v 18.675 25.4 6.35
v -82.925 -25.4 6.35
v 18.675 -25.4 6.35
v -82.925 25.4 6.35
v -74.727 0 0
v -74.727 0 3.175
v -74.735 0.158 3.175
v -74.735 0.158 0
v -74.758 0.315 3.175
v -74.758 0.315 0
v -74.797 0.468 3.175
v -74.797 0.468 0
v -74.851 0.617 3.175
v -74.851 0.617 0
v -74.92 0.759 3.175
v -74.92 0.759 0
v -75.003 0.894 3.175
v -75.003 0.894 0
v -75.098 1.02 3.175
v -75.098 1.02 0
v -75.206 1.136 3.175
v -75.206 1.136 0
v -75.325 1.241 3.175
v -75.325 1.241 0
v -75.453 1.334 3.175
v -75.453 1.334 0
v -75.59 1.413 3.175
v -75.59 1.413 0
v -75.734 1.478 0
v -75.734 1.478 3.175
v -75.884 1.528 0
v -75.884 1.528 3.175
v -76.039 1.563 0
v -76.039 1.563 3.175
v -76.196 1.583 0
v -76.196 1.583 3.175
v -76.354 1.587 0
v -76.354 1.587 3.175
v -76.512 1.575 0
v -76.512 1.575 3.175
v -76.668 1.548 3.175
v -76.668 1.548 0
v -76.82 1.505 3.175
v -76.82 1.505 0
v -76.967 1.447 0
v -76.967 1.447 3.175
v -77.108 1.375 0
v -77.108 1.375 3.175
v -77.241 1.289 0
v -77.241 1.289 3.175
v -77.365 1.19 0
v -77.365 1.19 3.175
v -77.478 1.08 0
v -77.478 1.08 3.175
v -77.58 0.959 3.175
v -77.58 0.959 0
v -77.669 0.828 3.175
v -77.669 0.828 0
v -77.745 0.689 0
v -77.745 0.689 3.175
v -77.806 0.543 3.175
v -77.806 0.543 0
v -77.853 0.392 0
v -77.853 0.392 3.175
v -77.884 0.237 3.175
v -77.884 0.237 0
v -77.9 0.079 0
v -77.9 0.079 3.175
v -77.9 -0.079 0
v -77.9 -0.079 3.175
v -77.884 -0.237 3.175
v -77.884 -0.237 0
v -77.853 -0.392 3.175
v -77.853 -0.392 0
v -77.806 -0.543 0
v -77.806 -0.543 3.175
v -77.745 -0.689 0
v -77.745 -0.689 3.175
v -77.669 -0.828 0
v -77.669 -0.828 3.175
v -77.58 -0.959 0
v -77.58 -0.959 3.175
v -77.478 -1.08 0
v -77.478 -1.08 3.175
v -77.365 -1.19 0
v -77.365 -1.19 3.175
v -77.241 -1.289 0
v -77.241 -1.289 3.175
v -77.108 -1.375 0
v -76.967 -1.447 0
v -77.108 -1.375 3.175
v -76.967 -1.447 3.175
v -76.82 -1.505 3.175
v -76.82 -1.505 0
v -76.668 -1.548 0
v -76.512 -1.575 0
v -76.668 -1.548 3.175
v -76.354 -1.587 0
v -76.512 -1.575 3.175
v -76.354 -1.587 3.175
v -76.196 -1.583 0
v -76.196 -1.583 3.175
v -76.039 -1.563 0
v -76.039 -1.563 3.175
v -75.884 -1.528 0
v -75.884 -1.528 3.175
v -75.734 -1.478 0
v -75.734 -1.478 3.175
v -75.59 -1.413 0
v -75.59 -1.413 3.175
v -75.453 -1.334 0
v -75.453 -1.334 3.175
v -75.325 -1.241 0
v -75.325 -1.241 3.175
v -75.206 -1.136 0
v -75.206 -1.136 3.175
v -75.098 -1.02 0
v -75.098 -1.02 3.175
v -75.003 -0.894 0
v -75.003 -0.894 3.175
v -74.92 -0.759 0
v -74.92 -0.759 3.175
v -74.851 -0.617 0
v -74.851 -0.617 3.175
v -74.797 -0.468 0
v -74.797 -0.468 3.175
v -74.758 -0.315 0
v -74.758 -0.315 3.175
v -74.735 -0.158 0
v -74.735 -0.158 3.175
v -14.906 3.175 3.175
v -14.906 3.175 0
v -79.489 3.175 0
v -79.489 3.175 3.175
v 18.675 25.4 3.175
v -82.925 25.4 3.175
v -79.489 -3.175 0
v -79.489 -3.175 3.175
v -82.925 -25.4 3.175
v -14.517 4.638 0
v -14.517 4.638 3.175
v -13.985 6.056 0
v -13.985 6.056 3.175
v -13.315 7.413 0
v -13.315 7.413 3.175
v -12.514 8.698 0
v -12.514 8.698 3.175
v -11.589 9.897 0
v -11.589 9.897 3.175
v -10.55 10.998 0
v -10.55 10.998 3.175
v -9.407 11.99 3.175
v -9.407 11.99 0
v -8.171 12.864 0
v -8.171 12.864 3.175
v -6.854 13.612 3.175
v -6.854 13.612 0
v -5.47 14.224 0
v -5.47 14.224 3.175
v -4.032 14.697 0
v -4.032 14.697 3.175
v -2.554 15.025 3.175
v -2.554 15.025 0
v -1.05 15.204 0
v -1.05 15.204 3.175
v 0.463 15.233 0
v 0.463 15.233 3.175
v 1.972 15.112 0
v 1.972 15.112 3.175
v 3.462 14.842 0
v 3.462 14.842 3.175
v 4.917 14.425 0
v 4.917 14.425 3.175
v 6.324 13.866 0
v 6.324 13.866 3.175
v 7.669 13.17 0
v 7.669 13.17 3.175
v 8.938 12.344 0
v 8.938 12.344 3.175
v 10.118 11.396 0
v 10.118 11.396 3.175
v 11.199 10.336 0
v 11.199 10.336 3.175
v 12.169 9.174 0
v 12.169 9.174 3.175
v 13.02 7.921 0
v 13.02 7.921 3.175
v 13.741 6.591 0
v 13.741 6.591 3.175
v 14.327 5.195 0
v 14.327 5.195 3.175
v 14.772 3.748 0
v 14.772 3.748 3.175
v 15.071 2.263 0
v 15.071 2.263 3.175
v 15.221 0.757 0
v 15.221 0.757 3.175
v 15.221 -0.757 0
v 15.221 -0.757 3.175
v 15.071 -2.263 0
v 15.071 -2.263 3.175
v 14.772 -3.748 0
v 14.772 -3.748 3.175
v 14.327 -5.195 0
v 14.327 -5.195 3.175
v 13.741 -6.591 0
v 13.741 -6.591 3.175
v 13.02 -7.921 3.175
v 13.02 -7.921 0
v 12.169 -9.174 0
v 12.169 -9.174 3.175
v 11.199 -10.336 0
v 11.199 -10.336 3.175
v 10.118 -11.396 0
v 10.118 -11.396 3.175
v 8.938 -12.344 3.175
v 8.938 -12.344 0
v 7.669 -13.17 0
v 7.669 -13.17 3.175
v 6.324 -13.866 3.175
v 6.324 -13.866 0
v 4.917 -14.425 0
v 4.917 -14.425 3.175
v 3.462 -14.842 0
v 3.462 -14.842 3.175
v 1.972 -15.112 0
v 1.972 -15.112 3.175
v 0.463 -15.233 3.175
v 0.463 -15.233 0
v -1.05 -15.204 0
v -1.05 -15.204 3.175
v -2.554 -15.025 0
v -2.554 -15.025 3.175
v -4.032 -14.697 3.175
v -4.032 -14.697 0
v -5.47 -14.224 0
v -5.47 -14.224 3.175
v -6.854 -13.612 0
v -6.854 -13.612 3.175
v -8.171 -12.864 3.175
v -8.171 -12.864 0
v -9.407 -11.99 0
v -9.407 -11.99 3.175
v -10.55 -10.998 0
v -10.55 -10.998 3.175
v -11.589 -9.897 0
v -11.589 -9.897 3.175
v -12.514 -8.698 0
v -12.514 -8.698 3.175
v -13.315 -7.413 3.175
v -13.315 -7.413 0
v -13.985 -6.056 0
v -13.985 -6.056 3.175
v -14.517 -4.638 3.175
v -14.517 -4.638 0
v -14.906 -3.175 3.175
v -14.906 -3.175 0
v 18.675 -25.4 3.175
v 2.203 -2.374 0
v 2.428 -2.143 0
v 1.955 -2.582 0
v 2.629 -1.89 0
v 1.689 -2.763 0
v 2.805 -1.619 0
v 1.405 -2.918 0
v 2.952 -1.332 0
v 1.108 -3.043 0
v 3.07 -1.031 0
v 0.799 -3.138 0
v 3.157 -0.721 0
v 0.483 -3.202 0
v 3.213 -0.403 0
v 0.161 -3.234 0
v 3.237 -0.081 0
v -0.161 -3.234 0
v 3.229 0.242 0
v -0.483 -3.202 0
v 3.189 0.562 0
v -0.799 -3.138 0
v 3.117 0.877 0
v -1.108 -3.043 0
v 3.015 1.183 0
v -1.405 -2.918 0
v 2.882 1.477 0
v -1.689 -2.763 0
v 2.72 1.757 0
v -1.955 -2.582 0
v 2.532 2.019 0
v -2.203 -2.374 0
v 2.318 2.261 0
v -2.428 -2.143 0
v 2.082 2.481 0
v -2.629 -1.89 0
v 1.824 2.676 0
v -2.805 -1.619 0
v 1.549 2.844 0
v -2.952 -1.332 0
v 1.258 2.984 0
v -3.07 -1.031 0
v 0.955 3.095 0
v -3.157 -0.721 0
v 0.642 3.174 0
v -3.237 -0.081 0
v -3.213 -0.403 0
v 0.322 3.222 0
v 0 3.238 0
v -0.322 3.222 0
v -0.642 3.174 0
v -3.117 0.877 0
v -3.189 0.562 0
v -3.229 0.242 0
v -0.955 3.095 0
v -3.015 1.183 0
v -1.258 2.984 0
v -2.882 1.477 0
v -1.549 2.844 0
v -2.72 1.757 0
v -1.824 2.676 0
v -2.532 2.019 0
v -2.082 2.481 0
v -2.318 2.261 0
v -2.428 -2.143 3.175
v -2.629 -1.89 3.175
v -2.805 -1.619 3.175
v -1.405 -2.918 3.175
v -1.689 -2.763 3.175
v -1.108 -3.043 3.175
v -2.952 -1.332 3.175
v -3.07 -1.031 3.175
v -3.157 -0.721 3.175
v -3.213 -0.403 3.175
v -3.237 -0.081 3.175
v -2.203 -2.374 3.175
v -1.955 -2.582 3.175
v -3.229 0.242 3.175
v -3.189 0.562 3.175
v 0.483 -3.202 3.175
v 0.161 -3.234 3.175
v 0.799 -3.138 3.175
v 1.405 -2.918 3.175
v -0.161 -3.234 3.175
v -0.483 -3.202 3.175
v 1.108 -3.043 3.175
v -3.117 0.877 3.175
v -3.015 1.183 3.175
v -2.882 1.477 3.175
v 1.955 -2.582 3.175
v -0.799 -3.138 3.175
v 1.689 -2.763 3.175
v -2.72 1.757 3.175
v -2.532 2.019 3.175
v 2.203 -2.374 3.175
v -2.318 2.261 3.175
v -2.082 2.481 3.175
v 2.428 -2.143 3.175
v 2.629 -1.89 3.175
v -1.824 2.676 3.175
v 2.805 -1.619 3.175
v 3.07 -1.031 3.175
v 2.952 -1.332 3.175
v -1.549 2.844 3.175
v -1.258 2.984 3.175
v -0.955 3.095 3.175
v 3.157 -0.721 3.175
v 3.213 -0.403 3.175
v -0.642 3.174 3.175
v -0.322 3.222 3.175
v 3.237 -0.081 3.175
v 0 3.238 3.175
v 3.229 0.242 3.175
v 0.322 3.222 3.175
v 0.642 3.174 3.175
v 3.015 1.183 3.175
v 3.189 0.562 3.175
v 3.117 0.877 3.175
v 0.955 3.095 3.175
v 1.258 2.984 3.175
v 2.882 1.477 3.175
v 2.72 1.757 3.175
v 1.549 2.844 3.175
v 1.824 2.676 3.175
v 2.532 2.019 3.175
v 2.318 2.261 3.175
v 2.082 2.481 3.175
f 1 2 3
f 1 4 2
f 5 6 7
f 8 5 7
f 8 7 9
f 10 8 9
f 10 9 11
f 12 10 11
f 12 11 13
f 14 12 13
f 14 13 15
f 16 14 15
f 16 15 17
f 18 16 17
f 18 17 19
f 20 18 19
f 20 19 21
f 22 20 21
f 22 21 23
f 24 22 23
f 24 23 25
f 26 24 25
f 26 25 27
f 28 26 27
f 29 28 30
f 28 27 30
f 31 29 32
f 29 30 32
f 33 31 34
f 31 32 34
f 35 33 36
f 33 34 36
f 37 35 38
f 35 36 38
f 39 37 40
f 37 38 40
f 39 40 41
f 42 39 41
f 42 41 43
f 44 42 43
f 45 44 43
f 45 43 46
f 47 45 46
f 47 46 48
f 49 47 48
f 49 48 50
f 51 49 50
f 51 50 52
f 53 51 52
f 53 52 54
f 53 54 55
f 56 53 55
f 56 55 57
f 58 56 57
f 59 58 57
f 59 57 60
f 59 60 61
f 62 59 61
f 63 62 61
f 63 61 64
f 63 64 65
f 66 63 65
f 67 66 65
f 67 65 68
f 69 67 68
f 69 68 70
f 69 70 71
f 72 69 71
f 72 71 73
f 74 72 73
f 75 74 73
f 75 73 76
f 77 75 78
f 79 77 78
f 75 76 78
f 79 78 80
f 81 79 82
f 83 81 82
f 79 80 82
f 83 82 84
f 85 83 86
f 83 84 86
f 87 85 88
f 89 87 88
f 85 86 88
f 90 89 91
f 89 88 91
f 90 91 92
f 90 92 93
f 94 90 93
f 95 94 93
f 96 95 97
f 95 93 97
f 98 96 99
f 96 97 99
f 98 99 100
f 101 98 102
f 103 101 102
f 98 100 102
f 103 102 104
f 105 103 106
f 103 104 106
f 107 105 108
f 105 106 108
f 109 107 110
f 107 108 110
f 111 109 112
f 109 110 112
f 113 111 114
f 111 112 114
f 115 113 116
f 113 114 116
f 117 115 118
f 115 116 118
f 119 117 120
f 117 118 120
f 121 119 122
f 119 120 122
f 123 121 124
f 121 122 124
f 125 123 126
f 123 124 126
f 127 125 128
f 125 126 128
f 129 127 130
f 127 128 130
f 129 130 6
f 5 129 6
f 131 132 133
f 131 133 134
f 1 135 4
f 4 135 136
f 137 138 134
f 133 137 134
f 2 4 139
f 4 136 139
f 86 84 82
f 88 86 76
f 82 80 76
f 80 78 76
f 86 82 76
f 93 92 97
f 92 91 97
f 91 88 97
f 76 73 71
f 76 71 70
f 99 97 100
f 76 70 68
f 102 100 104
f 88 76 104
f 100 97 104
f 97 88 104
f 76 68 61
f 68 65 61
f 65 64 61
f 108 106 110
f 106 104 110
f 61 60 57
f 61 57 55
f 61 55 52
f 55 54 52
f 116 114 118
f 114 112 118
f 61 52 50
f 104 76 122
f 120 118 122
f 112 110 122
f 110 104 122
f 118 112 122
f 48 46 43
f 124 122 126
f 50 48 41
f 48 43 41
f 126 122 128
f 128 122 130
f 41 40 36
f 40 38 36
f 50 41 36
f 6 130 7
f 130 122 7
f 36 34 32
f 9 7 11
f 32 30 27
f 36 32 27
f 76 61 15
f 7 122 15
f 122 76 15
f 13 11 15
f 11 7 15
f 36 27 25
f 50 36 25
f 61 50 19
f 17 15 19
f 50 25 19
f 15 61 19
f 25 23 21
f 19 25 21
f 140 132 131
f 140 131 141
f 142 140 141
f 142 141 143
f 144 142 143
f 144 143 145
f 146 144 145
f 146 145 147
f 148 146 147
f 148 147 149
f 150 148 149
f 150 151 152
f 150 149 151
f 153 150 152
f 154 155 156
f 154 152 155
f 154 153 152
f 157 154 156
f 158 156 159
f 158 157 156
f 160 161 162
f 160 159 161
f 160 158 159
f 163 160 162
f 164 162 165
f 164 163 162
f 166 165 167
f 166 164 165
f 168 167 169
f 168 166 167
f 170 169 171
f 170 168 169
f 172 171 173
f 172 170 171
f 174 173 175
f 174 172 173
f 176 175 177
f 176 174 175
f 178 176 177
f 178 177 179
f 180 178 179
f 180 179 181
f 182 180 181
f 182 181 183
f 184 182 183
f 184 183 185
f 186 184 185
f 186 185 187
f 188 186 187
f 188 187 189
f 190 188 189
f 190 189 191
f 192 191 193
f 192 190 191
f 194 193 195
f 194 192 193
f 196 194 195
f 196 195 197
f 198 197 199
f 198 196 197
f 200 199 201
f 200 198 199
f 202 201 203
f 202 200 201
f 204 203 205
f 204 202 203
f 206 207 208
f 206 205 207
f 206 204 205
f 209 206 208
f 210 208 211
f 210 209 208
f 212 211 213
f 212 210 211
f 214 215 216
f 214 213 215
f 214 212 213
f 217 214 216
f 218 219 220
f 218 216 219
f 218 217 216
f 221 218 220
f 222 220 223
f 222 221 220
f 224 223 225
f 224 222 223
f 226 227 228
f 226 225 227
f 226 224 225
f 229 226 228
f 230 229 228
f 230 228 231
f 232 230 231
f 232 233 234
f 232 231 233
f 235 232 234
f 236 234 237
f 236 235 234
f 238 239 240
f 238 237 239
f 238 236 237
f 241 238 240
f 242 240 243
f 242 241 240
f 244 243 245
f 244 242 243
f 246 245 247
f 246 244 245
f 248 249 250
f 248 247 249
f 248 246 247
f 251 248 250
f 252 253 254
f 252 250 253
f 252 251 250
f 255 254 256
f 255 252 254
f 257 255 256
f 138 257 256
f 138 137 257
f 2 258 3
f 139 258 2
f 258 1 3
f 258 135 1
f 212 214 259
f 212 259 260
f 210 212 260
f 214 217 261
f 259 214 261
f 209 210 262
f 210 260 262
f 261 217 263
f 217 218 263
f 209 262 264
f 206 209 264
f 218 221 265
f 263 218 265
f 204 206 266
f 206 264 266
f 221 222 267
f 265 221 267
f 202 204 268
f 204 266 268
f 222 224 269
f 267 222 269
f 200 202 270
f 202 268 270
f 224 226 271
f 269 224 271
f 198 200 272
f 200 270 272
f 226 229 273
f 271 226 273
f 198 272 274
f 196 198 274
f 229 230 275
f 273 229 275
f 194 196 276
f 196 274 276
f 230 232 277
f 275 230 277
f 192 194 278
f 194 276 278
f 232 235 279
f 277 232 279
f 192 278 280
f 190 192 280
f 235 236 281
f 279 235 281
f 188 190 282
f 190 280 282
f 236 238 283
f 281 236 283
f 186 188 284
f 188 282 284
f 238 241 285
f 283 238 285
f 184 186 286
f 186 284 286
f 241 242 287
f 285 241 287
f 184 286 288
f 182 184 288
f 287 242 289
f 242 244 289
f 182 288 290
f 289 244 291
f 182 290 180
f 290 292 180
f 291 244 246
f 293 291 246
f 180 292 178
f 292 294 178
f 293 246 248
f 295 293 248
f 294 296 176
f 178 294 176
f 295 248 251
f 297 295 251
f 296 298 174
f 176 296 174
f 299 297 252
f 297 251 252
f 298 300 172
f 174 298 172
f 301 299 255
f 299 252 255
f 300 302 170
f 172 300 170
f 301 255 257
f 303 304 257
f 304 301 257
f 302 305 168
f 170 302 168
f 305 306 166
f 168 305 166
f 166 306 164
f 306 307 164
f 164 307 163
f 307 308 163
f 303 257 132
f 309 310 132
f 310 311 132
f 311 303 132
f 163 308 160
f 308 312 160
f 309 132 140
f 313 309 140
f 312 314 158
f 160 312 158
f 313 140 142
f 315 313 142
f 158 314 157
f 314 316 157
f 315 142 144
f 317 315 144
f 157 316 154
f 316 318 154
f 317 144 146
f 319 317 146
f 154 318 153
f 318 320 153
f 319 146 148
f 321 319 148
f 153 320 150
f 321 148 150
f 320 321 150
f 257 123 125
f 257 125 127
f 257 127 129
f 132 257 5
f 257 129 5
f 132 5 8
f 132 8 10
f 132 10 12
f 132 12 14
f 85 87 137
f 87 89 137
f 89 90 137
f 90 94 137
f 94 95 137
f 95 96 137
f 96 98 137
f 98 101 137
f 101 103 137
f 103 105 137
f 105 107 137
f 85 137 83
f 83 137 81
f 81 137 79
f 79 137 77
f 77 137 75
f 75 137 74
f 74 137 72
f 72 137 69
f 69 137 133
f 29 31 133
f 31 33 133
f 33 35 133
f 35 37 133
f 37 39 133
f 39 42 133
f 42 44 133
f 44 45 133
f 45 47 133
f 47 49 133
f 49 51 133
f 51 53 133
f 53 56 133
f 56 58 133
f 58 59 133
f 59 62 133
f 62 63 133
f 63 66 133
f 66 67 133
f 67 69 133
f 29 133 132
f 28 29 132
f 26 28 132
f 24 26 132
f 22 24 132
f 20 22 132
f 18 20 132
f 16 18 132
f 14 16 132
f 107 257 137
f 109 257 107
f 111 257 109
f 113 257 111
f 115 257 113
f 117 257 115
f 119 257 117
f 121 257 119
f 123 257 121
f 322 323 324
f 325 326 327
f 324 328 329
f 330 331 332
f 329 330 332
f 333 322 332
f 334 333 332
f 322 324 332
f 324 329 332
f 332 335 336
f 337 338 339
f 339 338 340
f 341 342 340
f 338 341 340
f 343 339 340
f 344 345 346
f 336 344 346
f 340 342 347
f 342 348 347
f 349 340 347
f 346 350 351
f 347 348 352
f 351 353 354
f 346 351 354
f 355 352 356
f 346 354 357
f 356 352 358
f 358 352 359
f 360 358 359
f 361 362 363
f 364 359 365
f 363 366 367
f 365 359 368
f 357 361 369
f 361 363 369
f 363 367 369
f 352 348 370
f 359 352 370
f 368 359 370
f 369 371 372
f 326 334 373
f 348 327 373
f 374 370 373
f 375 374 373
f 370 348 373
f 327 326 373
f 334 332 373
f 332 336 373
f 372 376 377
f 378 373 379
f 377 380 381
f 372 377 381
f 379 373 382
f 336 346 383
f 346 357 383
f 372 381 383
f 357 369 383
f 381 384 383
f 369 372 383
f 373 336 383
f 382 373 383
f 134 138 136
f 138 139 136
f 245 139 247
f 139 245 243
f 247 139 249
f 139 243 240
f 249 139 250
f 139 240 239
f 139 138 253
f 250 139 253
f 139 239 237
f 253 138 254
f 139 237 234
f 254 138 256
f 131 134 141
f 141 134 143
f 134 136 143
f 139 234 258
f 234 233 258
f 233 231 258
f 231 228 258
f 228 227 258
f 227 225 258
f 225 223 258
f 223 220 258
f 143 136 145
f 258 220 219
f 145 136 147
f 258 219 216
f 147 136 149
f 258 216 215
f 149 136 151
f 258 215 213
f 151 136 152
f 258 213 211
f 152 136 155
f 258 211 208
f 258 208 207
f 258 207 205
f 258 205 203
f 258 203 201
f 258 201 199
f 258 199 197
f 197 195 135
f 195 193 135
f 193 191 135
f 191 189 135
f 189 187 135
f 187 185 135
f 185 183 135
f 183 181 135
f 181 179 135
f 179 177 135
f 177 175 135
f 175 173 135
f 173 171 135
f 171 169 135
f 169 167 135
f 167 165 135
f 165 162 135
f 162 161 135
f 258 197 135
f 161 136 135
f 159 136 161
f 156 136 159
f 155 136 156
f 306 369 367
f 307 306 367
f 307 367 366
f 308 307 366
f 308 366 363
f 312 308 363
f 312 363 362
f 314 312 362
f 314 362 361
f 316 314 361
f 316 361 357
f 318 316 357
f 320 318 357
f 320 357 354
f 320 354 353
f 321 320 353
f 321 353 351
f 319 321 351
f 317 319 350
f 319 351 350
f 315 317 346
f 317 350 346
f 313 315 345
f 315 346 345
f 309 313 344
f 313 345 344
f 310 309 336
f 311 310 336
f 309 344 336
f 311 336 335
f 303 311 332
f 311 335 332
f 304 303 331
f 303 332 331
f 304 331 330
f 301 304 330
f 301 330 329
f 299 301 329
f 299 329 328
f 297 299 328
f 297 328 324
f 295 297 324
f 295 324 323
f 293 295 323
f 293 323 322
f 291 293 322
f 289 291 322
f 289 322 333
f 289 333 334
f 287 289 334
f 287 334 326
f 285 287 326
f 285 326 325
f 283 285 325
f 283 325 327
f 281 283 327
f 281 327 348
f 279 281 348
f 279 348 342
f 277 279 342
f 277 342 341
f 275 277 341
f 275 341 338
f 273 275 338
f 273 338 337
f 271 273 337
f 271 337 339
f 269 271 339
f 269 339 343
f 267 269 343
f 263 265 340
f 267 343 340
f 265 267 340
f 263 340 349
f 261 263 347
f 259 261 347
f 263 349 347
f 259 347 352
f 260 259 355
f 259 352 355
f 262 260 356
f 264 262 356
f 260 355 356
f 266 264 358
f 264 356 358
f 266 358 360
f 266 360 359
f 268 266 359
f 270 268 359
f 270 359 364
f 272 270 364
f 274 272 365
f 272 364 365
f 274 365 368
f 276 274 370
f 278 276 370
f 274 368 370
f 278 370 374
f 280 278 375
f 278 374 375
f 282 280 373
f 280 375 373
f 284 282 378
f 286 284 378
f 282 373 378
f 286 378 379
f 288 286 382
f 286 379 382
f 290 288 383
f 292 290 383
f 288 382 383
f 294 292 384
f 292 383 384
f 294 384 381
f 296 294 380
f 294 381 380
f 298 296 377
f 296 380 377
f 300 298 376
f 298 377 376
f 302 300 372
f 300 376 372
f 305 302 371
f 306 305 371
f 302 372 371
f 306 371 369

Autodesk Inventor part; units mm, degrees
ref_plane "YZ Plane" through (0, 0, 0) normal (1, 0, 0) x (0, 1, 0)
ref_plane "XZ Plane" through (0, 0, 0) normal (0, 1, 0) x (-1, 0, 0)
sketch "Sketch1" plane through (0, 0, 0) normal (0, 0, 1) x (1, 0, 0)
  circle A0 centre (0, 0) radius 15.24
extrude "Extrusion1" add sketch "Sketch1" along normal blind 3.175
sketch "Sketch2" plane through (0, 0, 3.175) normal (0, 0, 1) x (1, 0, 0)
  circle A0 centre (0, 0) radius 15.24 projected
  line L0 (-15.24, 0) -> (-15.24, 3.175)
  line L1 (-15.24, 0) -> (-15.24, -3.175)
  dimension "d3" = 3.175
  dimension "d4" = 3.175
ref_plane "Work Plane1" through (-15.24, 0, 3.175) normal (1, 0, 0) x (0, 1, 0)
sketch "Sketch3" plane through (-15.24, 0, 3.175) normal (1, 0, 0) x (0, 1, 0)
  line L0 (15.24, 0) -> (-15.24, 0) projected
  line L1 (-15.24, -3.175) -> (15.24, -3.175) projected
  line L2 (0, -3.175) -> (3.175, -3.175)
  line L3 (3.175, -3.175) -> (3.175, 0)
  line L4 (3.175, 0) -> (-3.175, 0)
  line L5 (-3.175, 0) -> (-3.175, -3.175)
  line L6 (-3.175, -3.175) -> (3.175, -3.175)
  dimension "d6" = 6.35
extrude "Extrusion2" add sketch "Sketch3" against normal blind 64.2493
sketch "Sketch4" plane through (-15.24, 0, 3.175) normal (1, 0, 0) x (0, 0, -1)
  line L0 (3.175, -3.175) -> (3.175, 0) projected
  line L1 (0, 3.175) -> (3.175, 3.175)
  line L2 (3.175, 3.175) -> (3.175, -3.175)
  line L3 (3.175, -3.175) -> (0, -3.175)
  line L4 (0, -3.175) -> (0, 3.175)
extrude "Extrusion3" add sketch "Sketch4" along normal blind 12.7
sketch "Sketch6" plane through (0, 0, 0) normal (0, 0, -1) x (-1, 0, 0)
  circle A0 centre (0, 0) radius 3.2385
  dimension "d24" = 6.477
hole "Hole1" at (0, 0, 0) direction (0, 0, -1) diameter 6.477 end through all
hole "Hole2" at (0, 0, 0) direction (0, 0, 1) diameter 6.477 depth 7.9375 tip angle 118
sketch "Sketch7" plane through (0, 0, 3.175) normal (0, 0, 1) x (1, 0, 0)
  line L0 (-79.4893, -3.175) -> (-79.4893, 3.175) projected
  line L1 (-79.4893, 0) -> (-76.3143, 0)
  circle A0 centre (-76.3143, 0) radius 1.5875
  point P0 (0, 0)
  dimension "d39" = 3.175
  dimension "d40" = 3.175
extrude "Extrusion6" cut sketch "Sketch7" against normal blind 25.4
sketch "Sketch8" plane through (0, 0, 3.175) normal (0, 0, 1) x (1, 0, 0)
  arc A0 (-14.9056, -3.175) -> (-14.9056, 3.175) centre (0, 0) ccw projected
  line L0 (-32.1247, -25.4) -> (18.6753, -25.4)
  line L1 (-32.1247, -25.4) -> (-82.9246, -25.4)
  line L2 (-32.1247, 25.4) -> (-82.9246, 25.4)
  line L3 (-32.1247, 25.4) -> (18.6753, 25.4)
  line L4 (18.6753, 25.4) -> (18.6753, -25.4)
  line L5 (-82.9246, 25.4) -> (-82.9246, -25.4)
  dimension "d45" = 50.8
  dimension "d46" = 50.8
  dimension "d47" = 50.8
  dimension "d48" = 50.8
extrude "Extrusion7" add sketch "Sketch8" along normal blind 3.175
sketch "Sketch9" plane through (-79.4893, -3.175, 0) normal (0, -1, 0) x (1, 0, 0)
  line L0 (64.5837, 3.175) -> (64.5837, 0) projected
  line L1 (64.5837, 0) -> (64.5837, 3.175)
  point P0 (79.4893, 0)
sketch "Sketch10" plane through (-79.4893, 3.175, 0) normal (0, 1, 0) x (1, 0, 0)
  line L0 (64.5837, -3.175) -> (64.5837, 0) projected
  line L1 (64.5837, 0) -> (64.5837, -3.175)
  point P0 (79.4893, 0)
sketch "Sketch11" plane through (0, 0, 3.175) normal (0, 0, -1) x (-1, 0, 0)
  line L0 (14.9056, 3.175) -> (79.4893, 3.175) projected
  line L1 (79.4893, 3.175) -> (79.4893, -3.175) projected
  line L2 (14.9056, 3.175) -> (79.4893, 3.175)
  line L3 (79.4893, -3.175) -> (14.9056, -3.175) projected
  line L4 (14.9056, -3.175) -> (79.4893, -3.175)
  arc A0 (14.9056, 3.175) -> (14.9056, -3.175) centre (0, 0) ccw projected
  circle A1 centre (0, 0) radius 3.2385 projected
  line L5 (79.4893, -3.175) -> (14.9056, -3.175) projected
  dimension "d51" = 64.5837
  dimension "d52" = 64.5837
  dimension "d53" = 18.4785
  dimension "d54" = 6.35
  dimension "d55" = 14.9056
sketch "Sketch12" plane through (-82.9246, -25.4, 3.175) normal (0, -1, 0) x (1, 0, 0)
  line L0 (0, 0) -> (101.6, 0) projected
  line L1 (68.019, -3.175) -> (98.1646, -3.175) projected
  point P0 (82.9246, -3.175)
  dimension "d56" = 3.175
sketch "Sketch13" plane through (0, 0, 3.175) normal (0, 0, -1) x (-1, 0, 0)
  point P0 (0, 0)
sketch "Sketch14" plane through (0, 0, 0) normal (0, 0, -1) x (-1, 0, 0)
  circle A0 centre (0, 0) radius 15.24 projected
  circle A1 centre (76.3143, 0) radius 1.5875 projected
  circle A2 centre (0, 0) radius 3.2385 projected
  line L0 (79.4893, -3.175) -> (14.9056, -3.175) projected
  line L1 (79.4893, 3.175) -> (79.4893, -3.175) projected
  line L2 (14.9056, 3.175) -> (79.4893, 3.175) projected
  arc A3 (14.9056, 3.175) -> (14.9056, -3.175) centre (0, 0) ccw projected
  line L3 (15.24, -15.24) -> (15.24, 15.24) projected
  line L4 (-18.6753, 25.4) -> (82.9246, 25.4) projected
  line L5 (-18.6753, -25.4) -> (-18.6753, 25.4) projected
  line L6 (82.9246, -25.4) -> (-18.6753, -25.4) projected
  line L7 (82.9246, 25.4) -> (82.9246, -25.4) projected
  line L8 (79.4893, 3.175) -> (14.9056, 3.175) projected
  line L9 (79.4893, -3.175) -> (79.4893, 3.175) projected
  line L10 (79.4893, -3.175) -> (14.9056, -3.175) projected
  arc A4 (14.9056, 3.175) -> (14.9056, -3.175) centre (0, 0) ccw projected
  line L11 (14.9056, -3.175) -> (14.9056, -3.5133)
  dimension "d57" = 0.3344
properties part number "ClawLinkage"
